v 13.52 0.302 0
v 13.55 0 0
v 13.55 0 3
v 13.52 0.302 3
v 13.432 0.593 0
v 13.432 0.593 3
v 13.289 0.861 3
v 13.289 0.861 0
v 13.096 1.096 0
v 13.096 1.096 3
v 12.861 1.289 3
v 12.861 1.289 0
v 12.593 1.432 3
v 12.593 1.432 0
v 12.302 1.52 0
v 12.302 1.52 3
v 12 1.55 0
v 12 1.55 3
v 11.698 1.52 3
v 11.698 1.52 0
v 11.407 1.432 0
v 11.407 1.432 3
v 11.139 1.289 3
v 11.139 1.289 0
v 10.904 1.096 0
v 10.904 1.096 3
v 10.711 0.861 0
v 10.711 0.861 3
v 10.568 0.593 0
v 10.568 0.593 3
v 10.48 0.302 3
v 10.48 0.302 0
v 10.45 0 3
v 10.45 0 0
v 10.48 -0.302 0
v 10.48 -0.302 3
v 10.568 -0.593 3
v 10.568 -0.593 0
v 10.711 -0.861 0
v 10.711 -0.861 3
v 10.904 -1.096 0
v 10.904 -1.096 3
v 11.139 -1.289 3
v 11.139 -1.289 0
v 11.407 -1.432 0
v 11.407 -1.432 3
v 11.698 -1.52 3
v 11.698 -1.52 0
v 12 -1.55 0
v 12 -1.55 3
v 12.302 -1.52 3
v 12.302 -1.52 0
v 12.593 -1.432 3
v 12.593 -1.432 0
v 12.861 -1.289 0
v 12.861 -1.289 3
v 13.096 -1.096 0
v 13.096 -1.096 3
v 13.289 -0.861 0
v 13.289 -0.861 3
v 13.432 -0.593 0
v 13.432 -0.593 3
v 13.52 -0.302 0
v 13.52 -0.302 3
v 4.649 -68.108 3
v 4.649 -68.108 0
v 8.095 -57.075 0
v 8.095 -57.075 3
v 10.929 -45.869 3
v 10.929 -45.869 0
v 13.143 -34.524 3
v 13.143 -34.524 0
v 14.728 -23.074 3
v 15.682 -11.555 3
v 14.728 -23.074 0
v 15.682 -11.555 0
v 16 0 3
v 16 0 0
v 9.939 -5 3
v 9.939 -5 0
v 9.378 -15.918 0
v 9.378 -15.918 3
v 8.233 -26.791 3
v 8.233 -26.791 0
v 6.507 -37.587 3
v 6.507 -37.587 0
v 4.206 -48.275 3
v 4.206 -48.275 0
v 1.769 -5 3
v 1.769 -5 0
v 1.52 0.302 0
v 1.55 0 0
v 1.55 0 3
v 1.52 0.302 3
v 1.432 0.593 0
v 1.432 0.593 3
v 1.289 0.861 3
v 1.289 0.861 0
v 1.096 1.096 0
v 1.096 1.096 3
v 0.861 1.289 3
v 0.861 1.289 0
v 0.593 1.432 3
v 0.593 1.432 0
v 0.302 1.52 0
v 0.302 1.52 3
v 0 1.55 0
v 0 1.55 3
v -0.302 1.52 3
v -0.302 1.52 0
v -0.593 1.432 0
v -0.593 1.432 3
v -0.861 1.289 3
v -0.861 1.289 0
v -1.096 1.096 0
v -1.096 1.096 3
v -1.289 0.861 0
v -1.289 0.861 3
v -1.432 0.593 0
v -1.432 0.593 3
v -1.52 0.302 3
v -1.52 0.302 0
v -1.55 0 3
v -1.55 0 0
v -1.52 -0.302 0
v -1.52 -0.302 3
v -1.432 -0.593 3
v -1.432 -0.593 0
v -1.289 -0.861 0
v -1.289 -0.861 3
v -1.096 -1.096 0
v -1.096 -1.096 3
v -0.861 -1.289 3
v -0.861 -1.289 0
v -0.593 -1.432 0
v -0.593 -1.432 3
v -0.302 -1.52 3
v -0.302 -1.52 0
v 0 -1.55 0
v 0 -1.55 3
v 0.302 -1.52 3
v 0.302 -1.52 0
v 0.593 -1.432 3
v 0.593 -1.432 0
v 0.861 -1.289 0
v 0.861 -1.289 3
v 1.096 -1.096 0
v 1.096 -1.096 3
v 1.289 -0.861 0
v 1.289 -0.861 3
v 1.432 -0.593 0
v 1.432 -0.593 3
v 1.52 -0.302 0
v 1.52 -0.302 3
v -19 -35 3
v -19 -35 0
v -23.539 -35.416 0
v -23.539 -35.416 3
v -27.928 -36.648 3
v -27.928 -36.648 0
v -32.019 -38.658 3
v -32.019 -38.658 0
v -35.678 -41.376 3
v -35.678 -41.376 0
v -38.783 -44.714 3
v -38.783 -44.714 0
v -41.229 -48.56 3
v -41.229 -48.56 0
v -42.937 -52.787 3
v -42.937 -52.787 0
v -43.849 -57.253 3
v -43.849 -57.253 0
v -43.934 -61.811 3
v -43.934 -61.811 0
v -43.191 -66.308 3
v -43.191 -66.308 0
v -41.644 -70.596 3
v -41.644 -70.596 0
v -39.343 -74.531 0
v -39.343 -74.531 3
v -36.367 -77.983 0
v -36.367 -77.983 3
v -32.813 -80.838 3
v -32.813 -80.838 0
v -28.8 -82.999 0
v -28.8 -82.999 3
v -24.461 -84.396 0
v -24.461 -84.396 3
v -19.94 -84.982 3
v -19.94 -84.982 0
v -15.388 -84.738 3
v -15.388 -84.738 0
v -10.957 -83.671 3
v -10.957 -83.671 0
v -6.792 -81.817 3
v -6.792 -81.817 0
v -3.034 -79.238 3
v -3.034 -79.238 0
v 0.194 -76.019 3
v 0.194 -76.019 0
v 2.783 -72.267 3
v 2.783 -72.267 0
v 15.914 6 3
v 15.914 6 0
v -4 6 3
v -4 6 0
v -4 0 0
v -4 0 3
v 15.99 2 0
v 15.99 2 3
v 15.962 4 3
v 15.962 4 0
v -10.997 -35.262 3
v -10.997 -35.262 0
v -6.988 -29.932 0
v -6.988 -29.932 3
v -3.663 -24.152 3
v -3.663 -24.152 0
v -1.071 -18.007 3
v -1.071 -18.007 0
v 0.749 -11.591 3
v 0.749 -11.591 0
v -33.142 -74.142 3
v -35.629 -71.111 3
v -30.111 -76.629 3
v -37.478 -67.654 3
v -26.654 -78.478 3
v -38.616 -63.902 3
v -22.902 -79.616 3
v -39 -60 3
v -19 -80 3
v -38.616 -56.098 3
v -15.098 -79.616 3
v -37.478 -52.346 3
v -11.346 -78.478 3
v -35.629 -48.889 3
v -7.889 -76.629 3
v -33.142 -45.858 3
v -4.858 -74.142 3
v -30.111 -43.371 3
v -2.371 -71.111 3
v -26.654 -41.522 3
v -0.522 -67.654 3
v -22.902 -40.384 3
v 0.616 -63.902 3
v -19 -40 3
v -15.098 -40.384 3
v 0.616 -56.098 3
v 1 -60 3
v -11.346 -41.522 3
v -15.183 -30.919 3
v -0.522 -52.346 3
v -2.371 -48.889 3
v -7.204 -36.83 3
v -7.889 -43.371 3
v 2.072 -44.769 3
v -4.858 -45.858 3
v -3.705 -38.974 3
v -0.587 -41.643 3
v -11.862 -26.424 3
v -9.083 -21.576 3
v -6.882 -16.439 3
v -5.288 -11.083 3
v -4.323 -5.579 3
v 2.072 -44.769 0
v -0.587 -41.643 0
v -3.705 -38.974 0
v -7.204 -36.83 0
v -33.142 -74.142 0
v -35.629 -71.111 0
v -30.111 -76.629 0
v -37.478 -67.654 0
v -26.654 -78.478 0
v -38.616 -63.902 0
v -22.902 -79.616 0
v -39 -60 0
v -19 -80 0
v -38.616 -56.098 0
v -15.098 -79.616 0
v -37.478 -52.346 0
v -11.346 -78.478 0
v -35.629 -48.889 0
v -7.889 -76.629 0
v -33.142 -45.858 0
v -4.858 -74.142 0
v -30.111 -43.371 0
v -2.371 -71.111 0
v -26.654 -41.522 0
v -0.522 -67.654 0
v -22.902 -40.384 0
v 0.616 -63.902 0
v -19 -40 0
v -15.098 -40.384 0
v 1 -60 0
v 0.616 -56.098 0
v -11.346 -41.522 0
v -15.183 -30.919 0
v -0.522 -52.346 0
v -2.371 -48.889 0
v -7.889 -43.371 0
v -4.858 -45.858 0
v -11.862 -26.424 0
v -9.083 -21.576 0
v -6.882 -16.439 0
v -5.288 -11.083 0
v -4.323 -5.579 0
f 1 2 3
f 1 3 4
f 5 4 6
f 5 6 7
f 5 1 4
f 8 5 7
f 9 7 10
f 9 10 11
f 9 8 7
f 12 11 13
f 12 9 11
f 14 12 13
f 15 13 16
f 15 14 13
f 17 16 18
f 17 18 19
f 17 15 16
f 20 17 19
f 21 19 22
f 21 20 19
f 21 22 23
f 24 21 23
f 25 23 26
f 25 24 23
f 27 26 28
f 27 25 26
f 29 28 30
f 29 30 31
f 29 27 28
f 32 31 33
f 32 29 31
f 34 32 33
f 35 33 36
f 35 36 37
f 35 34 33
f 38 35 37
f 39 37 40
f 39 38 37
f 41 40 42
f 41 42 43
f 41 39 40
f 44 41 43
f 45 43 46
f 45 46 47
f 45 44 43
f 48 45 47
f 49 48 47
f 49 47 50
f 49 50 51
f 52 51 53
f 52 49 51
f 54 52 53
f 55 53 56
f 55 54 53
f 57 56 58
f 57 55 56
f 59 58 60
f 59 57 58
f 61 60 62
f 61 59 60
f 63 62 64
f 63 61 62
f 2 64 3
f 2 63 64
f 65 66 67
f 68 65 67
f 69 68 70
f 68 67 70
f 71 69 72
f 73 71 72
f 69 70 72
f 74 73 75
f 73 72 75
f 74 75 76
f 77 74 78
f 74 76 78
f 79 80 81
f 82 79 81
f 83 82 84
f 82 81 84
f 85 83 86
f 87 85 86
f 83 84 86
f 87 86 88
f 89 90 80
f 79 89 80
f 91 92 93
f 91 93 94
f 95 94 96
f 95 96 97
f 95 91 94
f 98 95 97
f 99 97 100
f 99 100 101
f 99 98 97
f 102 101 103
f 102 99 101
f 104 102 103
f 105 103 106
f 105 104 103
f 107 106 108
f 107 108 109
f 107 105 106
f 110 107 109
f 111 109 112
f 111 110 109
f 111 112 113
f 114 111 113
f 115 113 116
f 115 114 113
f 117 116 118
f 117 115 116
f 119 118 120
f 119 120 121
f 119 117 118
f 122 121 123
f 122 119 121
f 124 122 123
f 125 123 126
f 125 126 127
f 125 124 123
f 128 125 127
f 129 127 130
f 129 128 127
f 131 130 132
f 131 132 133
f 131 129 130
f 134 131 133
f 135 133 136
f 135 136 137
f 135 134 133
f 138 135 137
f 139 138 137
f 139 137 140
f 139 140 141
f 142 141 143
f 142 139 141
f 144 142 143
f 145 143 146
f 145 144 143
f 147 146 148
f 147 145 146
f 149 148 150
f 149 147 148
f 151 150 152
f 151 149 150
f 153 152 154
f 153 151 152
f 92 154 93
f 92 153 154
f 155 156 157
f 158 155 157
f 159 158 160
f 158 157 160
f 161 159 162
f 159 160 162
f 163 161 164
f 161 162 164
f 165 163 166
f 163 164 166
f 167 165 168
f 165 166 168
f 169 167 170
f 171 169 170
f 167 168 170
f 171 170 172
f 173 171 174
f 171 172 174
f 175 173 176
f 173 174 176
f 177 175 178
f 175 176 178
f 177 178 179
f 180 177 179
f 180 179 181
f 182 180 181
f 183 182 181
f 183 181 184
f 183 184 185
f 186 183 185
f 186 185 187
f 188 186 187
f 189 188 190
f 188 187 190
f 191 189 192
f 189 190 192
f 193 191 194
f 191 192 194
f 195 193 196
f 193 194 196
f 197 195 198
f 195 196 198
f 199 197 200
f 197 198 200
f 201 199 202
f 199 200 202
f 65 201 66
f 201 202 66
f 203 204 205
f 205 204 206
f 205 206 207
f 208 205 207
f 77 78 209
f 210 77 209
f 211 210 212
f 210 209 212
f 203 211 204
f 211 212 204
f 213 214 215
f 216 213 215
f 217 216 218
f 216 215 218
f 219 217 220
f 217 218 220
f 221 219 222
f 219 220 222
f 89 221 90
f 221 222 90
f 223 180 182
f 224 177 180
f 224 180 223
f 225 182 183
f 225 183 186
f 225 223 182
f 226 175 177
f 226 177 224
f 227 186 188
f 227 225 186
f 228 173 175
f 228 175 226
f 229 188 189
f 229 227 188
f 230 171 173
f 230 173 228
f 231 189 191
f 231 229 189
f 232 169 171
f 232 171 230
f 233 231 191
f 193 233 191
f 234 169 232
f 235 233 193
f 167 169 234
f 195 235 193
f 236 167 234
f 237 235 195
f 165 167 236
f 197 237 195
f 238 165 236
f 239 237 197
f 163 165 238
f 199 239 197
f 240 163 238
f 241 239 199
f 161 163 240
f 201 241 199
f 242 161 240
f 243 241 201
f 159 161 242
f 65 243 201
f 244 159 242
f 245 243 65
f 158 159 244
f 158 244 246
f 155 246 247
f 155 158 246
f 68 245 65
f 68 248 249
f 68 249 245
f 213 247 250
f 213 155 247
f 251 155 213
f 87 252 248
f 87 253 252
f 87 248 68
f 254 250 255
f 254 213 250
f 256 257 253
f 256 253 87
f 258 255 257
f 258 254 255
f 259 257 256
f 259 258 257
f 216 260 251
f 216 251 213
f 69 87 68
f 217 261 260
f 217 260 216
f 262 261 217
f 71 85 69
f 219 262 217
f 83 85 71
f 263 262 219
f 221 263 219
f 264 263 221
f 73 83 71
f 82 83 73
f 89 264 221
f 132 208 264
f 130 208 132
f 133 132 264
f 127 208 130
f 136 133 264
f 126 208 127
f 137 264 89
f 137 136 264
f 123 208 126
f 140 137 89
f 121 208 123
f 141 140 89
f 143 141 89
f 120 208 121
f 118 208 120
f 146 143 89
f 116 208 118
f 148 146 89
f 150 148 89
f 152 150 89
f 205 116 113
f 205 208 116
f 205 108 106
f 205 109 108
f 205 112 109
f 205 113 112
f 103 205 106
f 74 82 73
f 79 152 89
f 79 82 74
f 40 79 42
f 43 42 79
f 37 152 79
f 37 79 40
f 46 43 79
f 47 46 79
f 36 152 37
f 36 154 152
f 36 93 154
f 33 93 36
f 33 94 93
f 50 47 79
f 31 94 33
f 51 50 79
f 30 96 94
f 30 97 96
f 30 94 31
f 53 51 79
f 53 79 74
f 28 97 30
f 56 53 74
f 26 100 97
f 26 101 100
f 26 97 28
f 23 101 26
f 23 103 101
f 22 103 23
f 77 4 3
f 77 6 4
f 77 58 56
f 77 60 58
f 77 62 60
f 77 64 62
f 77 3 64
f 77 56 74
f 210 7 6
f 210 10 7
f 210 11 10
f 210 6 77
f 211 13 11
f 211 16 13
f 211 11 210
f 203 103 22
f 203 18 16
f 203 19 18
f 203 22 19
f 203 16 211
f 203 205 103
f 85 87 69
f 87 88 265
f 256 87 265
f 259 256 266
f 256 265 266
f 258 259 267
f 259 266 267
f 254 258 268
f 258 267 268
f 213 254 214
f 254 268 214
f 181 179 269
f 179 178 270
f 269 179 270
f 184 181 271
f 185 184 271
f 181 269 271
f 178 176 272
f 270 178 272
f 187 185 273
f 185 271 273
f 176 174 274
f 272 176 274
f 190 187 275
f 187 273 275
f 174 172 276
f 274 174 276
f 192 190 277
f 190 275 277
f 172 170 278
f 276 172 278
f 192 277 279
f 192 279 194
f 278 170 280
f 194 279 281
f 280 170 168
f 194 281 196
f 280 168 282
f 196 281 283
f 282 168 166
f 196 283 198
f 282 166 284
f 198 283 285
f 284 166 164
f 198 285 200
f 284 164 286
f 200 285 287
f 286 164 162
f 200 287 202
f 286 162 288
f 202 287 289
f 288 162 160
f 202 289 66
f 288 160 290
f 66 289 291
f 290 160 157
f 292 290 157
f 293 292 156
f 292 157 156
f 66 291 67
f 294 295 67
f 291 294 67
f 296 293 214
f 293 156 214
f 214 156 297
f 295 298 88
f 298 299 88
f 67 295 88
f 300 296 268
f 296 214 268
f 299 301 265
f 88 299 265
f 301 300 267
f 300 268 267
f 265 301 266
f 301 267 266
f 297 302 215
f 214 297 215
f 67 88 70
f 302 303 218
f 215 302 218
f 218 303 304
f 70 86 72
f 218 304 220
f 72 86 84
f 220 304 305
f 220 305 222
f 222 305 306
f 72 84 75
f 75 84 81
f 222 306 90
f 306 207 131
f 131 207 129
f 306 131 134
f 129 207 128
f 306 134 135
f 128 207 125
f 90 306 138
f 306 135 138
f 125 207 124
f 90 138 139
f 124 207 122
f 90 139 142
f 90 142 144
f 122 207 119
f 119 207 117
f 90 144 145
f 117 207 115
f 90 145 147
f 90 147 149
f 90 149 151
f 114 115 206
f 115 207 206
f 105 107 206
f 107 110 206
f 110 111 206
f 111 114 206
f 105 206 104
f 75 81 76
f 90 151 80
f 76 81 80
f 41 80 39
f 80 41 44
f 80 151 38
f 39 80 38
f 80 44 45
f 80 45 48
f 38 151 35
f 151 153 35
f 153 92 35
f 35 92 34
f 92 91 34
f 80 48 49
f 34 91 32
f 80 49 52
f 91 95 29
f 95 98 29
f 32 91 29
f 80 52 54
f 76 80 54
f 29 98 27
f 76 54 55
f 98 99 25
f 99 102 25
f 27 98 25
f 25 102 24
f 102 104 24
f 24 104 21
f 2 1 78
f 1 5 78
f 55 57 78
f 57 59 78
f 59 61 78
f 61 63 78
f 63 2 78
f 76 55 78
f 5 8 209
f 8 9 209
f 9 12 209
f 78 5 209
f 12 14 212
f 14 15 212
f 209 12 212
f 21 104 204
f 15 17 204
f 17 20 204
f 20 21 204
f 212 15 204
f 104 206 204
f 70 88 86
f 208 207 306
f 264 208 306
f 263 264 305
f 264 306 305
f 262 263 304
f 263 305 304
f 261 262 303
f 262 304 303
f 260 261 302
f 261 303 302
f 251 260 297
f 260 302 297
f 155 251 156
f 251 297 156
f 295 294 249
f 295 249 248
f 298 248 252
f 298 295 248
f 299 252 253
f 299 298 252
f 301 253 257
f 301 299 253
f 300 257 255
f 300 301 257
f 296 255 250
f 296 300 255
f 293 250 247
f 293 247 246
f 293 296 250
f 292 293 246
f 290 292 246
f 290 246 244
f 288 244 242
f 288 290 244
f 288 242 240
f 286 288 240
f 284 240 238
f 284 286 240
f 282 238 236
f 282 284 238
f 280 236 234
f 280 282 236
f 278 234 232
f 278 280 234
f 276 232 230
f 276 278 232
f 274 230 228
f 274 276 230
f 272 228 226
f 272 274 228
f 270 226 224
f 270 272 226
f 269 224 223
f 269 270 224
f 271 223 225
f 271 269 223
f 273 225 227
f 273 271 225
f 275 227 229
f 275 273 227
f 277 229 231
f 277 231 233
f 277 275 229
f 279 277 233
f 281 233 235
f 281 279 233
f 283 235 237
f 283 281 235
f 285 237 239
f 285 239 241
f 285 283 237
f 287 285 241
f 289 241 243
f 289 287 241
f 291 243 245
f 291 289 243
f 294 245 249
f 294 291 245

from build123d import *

# Parameters (mm, degrees)
SKETCH_1_R      = 20
SKETCH_1_R_2    = 1.55
EXTRUDE_1_DEPTH = 3


with BuildPart() as part:
    # 草图1 → 凸台-拉伸1 (new body)
    with BuildSketch(Plane.XY):
        with BuildLine():
            Line((-4, 6), (-4, 0))
            ThreePointArc((-4, 0), (-7.907990216, -19.039432765), (-19, -35))
            ThreePointArc((-19, -35), (-39.34333678, -74.530954843), (4.648648649, -68.108108108))
            ThreePointArc((4.648648649, -68.108108108), (13.142724005, -34.523787334), (16, 0))
            ThreePointArc((16, 0), (15.97856596, 3.000306232), (15.914268214, 6))
            Line((15.914268214, 6), (-4, 6))
        make_face()
        with Locations((-19, -60)):
            Circle(SKETCH_1_R, mode=Mode.SUBTRACT)
        with BuildLine():
            ThreePointArc((-10.997130101, -35.262294501), (-2.27235419, -21.118936487), (1.769449507, -5))
            Line((1.769449507, -5), (9.938716285, -5))
            ThreePointArc((9.938716285, -5), (8.233133382, -26.791038845), (4.205881516, -48.274512246))
            ThreePointArc((4.205881516, -48.274512246), (-2.093610856, -40.247177262), (-10.997130101, -35.262294501))
        make_face(mode=Mode.SUBTRACT)
        Circle(SKETCH_1_R_2, mode=Mode.SUBTRACT)
        with Locations((12, 0)):
            Circle(SKETCH_1_R_2, mode=Mode.SUBTRACT)
    extrude(amount=EXTRUDE_1_DEPTH)


solid = part.part
